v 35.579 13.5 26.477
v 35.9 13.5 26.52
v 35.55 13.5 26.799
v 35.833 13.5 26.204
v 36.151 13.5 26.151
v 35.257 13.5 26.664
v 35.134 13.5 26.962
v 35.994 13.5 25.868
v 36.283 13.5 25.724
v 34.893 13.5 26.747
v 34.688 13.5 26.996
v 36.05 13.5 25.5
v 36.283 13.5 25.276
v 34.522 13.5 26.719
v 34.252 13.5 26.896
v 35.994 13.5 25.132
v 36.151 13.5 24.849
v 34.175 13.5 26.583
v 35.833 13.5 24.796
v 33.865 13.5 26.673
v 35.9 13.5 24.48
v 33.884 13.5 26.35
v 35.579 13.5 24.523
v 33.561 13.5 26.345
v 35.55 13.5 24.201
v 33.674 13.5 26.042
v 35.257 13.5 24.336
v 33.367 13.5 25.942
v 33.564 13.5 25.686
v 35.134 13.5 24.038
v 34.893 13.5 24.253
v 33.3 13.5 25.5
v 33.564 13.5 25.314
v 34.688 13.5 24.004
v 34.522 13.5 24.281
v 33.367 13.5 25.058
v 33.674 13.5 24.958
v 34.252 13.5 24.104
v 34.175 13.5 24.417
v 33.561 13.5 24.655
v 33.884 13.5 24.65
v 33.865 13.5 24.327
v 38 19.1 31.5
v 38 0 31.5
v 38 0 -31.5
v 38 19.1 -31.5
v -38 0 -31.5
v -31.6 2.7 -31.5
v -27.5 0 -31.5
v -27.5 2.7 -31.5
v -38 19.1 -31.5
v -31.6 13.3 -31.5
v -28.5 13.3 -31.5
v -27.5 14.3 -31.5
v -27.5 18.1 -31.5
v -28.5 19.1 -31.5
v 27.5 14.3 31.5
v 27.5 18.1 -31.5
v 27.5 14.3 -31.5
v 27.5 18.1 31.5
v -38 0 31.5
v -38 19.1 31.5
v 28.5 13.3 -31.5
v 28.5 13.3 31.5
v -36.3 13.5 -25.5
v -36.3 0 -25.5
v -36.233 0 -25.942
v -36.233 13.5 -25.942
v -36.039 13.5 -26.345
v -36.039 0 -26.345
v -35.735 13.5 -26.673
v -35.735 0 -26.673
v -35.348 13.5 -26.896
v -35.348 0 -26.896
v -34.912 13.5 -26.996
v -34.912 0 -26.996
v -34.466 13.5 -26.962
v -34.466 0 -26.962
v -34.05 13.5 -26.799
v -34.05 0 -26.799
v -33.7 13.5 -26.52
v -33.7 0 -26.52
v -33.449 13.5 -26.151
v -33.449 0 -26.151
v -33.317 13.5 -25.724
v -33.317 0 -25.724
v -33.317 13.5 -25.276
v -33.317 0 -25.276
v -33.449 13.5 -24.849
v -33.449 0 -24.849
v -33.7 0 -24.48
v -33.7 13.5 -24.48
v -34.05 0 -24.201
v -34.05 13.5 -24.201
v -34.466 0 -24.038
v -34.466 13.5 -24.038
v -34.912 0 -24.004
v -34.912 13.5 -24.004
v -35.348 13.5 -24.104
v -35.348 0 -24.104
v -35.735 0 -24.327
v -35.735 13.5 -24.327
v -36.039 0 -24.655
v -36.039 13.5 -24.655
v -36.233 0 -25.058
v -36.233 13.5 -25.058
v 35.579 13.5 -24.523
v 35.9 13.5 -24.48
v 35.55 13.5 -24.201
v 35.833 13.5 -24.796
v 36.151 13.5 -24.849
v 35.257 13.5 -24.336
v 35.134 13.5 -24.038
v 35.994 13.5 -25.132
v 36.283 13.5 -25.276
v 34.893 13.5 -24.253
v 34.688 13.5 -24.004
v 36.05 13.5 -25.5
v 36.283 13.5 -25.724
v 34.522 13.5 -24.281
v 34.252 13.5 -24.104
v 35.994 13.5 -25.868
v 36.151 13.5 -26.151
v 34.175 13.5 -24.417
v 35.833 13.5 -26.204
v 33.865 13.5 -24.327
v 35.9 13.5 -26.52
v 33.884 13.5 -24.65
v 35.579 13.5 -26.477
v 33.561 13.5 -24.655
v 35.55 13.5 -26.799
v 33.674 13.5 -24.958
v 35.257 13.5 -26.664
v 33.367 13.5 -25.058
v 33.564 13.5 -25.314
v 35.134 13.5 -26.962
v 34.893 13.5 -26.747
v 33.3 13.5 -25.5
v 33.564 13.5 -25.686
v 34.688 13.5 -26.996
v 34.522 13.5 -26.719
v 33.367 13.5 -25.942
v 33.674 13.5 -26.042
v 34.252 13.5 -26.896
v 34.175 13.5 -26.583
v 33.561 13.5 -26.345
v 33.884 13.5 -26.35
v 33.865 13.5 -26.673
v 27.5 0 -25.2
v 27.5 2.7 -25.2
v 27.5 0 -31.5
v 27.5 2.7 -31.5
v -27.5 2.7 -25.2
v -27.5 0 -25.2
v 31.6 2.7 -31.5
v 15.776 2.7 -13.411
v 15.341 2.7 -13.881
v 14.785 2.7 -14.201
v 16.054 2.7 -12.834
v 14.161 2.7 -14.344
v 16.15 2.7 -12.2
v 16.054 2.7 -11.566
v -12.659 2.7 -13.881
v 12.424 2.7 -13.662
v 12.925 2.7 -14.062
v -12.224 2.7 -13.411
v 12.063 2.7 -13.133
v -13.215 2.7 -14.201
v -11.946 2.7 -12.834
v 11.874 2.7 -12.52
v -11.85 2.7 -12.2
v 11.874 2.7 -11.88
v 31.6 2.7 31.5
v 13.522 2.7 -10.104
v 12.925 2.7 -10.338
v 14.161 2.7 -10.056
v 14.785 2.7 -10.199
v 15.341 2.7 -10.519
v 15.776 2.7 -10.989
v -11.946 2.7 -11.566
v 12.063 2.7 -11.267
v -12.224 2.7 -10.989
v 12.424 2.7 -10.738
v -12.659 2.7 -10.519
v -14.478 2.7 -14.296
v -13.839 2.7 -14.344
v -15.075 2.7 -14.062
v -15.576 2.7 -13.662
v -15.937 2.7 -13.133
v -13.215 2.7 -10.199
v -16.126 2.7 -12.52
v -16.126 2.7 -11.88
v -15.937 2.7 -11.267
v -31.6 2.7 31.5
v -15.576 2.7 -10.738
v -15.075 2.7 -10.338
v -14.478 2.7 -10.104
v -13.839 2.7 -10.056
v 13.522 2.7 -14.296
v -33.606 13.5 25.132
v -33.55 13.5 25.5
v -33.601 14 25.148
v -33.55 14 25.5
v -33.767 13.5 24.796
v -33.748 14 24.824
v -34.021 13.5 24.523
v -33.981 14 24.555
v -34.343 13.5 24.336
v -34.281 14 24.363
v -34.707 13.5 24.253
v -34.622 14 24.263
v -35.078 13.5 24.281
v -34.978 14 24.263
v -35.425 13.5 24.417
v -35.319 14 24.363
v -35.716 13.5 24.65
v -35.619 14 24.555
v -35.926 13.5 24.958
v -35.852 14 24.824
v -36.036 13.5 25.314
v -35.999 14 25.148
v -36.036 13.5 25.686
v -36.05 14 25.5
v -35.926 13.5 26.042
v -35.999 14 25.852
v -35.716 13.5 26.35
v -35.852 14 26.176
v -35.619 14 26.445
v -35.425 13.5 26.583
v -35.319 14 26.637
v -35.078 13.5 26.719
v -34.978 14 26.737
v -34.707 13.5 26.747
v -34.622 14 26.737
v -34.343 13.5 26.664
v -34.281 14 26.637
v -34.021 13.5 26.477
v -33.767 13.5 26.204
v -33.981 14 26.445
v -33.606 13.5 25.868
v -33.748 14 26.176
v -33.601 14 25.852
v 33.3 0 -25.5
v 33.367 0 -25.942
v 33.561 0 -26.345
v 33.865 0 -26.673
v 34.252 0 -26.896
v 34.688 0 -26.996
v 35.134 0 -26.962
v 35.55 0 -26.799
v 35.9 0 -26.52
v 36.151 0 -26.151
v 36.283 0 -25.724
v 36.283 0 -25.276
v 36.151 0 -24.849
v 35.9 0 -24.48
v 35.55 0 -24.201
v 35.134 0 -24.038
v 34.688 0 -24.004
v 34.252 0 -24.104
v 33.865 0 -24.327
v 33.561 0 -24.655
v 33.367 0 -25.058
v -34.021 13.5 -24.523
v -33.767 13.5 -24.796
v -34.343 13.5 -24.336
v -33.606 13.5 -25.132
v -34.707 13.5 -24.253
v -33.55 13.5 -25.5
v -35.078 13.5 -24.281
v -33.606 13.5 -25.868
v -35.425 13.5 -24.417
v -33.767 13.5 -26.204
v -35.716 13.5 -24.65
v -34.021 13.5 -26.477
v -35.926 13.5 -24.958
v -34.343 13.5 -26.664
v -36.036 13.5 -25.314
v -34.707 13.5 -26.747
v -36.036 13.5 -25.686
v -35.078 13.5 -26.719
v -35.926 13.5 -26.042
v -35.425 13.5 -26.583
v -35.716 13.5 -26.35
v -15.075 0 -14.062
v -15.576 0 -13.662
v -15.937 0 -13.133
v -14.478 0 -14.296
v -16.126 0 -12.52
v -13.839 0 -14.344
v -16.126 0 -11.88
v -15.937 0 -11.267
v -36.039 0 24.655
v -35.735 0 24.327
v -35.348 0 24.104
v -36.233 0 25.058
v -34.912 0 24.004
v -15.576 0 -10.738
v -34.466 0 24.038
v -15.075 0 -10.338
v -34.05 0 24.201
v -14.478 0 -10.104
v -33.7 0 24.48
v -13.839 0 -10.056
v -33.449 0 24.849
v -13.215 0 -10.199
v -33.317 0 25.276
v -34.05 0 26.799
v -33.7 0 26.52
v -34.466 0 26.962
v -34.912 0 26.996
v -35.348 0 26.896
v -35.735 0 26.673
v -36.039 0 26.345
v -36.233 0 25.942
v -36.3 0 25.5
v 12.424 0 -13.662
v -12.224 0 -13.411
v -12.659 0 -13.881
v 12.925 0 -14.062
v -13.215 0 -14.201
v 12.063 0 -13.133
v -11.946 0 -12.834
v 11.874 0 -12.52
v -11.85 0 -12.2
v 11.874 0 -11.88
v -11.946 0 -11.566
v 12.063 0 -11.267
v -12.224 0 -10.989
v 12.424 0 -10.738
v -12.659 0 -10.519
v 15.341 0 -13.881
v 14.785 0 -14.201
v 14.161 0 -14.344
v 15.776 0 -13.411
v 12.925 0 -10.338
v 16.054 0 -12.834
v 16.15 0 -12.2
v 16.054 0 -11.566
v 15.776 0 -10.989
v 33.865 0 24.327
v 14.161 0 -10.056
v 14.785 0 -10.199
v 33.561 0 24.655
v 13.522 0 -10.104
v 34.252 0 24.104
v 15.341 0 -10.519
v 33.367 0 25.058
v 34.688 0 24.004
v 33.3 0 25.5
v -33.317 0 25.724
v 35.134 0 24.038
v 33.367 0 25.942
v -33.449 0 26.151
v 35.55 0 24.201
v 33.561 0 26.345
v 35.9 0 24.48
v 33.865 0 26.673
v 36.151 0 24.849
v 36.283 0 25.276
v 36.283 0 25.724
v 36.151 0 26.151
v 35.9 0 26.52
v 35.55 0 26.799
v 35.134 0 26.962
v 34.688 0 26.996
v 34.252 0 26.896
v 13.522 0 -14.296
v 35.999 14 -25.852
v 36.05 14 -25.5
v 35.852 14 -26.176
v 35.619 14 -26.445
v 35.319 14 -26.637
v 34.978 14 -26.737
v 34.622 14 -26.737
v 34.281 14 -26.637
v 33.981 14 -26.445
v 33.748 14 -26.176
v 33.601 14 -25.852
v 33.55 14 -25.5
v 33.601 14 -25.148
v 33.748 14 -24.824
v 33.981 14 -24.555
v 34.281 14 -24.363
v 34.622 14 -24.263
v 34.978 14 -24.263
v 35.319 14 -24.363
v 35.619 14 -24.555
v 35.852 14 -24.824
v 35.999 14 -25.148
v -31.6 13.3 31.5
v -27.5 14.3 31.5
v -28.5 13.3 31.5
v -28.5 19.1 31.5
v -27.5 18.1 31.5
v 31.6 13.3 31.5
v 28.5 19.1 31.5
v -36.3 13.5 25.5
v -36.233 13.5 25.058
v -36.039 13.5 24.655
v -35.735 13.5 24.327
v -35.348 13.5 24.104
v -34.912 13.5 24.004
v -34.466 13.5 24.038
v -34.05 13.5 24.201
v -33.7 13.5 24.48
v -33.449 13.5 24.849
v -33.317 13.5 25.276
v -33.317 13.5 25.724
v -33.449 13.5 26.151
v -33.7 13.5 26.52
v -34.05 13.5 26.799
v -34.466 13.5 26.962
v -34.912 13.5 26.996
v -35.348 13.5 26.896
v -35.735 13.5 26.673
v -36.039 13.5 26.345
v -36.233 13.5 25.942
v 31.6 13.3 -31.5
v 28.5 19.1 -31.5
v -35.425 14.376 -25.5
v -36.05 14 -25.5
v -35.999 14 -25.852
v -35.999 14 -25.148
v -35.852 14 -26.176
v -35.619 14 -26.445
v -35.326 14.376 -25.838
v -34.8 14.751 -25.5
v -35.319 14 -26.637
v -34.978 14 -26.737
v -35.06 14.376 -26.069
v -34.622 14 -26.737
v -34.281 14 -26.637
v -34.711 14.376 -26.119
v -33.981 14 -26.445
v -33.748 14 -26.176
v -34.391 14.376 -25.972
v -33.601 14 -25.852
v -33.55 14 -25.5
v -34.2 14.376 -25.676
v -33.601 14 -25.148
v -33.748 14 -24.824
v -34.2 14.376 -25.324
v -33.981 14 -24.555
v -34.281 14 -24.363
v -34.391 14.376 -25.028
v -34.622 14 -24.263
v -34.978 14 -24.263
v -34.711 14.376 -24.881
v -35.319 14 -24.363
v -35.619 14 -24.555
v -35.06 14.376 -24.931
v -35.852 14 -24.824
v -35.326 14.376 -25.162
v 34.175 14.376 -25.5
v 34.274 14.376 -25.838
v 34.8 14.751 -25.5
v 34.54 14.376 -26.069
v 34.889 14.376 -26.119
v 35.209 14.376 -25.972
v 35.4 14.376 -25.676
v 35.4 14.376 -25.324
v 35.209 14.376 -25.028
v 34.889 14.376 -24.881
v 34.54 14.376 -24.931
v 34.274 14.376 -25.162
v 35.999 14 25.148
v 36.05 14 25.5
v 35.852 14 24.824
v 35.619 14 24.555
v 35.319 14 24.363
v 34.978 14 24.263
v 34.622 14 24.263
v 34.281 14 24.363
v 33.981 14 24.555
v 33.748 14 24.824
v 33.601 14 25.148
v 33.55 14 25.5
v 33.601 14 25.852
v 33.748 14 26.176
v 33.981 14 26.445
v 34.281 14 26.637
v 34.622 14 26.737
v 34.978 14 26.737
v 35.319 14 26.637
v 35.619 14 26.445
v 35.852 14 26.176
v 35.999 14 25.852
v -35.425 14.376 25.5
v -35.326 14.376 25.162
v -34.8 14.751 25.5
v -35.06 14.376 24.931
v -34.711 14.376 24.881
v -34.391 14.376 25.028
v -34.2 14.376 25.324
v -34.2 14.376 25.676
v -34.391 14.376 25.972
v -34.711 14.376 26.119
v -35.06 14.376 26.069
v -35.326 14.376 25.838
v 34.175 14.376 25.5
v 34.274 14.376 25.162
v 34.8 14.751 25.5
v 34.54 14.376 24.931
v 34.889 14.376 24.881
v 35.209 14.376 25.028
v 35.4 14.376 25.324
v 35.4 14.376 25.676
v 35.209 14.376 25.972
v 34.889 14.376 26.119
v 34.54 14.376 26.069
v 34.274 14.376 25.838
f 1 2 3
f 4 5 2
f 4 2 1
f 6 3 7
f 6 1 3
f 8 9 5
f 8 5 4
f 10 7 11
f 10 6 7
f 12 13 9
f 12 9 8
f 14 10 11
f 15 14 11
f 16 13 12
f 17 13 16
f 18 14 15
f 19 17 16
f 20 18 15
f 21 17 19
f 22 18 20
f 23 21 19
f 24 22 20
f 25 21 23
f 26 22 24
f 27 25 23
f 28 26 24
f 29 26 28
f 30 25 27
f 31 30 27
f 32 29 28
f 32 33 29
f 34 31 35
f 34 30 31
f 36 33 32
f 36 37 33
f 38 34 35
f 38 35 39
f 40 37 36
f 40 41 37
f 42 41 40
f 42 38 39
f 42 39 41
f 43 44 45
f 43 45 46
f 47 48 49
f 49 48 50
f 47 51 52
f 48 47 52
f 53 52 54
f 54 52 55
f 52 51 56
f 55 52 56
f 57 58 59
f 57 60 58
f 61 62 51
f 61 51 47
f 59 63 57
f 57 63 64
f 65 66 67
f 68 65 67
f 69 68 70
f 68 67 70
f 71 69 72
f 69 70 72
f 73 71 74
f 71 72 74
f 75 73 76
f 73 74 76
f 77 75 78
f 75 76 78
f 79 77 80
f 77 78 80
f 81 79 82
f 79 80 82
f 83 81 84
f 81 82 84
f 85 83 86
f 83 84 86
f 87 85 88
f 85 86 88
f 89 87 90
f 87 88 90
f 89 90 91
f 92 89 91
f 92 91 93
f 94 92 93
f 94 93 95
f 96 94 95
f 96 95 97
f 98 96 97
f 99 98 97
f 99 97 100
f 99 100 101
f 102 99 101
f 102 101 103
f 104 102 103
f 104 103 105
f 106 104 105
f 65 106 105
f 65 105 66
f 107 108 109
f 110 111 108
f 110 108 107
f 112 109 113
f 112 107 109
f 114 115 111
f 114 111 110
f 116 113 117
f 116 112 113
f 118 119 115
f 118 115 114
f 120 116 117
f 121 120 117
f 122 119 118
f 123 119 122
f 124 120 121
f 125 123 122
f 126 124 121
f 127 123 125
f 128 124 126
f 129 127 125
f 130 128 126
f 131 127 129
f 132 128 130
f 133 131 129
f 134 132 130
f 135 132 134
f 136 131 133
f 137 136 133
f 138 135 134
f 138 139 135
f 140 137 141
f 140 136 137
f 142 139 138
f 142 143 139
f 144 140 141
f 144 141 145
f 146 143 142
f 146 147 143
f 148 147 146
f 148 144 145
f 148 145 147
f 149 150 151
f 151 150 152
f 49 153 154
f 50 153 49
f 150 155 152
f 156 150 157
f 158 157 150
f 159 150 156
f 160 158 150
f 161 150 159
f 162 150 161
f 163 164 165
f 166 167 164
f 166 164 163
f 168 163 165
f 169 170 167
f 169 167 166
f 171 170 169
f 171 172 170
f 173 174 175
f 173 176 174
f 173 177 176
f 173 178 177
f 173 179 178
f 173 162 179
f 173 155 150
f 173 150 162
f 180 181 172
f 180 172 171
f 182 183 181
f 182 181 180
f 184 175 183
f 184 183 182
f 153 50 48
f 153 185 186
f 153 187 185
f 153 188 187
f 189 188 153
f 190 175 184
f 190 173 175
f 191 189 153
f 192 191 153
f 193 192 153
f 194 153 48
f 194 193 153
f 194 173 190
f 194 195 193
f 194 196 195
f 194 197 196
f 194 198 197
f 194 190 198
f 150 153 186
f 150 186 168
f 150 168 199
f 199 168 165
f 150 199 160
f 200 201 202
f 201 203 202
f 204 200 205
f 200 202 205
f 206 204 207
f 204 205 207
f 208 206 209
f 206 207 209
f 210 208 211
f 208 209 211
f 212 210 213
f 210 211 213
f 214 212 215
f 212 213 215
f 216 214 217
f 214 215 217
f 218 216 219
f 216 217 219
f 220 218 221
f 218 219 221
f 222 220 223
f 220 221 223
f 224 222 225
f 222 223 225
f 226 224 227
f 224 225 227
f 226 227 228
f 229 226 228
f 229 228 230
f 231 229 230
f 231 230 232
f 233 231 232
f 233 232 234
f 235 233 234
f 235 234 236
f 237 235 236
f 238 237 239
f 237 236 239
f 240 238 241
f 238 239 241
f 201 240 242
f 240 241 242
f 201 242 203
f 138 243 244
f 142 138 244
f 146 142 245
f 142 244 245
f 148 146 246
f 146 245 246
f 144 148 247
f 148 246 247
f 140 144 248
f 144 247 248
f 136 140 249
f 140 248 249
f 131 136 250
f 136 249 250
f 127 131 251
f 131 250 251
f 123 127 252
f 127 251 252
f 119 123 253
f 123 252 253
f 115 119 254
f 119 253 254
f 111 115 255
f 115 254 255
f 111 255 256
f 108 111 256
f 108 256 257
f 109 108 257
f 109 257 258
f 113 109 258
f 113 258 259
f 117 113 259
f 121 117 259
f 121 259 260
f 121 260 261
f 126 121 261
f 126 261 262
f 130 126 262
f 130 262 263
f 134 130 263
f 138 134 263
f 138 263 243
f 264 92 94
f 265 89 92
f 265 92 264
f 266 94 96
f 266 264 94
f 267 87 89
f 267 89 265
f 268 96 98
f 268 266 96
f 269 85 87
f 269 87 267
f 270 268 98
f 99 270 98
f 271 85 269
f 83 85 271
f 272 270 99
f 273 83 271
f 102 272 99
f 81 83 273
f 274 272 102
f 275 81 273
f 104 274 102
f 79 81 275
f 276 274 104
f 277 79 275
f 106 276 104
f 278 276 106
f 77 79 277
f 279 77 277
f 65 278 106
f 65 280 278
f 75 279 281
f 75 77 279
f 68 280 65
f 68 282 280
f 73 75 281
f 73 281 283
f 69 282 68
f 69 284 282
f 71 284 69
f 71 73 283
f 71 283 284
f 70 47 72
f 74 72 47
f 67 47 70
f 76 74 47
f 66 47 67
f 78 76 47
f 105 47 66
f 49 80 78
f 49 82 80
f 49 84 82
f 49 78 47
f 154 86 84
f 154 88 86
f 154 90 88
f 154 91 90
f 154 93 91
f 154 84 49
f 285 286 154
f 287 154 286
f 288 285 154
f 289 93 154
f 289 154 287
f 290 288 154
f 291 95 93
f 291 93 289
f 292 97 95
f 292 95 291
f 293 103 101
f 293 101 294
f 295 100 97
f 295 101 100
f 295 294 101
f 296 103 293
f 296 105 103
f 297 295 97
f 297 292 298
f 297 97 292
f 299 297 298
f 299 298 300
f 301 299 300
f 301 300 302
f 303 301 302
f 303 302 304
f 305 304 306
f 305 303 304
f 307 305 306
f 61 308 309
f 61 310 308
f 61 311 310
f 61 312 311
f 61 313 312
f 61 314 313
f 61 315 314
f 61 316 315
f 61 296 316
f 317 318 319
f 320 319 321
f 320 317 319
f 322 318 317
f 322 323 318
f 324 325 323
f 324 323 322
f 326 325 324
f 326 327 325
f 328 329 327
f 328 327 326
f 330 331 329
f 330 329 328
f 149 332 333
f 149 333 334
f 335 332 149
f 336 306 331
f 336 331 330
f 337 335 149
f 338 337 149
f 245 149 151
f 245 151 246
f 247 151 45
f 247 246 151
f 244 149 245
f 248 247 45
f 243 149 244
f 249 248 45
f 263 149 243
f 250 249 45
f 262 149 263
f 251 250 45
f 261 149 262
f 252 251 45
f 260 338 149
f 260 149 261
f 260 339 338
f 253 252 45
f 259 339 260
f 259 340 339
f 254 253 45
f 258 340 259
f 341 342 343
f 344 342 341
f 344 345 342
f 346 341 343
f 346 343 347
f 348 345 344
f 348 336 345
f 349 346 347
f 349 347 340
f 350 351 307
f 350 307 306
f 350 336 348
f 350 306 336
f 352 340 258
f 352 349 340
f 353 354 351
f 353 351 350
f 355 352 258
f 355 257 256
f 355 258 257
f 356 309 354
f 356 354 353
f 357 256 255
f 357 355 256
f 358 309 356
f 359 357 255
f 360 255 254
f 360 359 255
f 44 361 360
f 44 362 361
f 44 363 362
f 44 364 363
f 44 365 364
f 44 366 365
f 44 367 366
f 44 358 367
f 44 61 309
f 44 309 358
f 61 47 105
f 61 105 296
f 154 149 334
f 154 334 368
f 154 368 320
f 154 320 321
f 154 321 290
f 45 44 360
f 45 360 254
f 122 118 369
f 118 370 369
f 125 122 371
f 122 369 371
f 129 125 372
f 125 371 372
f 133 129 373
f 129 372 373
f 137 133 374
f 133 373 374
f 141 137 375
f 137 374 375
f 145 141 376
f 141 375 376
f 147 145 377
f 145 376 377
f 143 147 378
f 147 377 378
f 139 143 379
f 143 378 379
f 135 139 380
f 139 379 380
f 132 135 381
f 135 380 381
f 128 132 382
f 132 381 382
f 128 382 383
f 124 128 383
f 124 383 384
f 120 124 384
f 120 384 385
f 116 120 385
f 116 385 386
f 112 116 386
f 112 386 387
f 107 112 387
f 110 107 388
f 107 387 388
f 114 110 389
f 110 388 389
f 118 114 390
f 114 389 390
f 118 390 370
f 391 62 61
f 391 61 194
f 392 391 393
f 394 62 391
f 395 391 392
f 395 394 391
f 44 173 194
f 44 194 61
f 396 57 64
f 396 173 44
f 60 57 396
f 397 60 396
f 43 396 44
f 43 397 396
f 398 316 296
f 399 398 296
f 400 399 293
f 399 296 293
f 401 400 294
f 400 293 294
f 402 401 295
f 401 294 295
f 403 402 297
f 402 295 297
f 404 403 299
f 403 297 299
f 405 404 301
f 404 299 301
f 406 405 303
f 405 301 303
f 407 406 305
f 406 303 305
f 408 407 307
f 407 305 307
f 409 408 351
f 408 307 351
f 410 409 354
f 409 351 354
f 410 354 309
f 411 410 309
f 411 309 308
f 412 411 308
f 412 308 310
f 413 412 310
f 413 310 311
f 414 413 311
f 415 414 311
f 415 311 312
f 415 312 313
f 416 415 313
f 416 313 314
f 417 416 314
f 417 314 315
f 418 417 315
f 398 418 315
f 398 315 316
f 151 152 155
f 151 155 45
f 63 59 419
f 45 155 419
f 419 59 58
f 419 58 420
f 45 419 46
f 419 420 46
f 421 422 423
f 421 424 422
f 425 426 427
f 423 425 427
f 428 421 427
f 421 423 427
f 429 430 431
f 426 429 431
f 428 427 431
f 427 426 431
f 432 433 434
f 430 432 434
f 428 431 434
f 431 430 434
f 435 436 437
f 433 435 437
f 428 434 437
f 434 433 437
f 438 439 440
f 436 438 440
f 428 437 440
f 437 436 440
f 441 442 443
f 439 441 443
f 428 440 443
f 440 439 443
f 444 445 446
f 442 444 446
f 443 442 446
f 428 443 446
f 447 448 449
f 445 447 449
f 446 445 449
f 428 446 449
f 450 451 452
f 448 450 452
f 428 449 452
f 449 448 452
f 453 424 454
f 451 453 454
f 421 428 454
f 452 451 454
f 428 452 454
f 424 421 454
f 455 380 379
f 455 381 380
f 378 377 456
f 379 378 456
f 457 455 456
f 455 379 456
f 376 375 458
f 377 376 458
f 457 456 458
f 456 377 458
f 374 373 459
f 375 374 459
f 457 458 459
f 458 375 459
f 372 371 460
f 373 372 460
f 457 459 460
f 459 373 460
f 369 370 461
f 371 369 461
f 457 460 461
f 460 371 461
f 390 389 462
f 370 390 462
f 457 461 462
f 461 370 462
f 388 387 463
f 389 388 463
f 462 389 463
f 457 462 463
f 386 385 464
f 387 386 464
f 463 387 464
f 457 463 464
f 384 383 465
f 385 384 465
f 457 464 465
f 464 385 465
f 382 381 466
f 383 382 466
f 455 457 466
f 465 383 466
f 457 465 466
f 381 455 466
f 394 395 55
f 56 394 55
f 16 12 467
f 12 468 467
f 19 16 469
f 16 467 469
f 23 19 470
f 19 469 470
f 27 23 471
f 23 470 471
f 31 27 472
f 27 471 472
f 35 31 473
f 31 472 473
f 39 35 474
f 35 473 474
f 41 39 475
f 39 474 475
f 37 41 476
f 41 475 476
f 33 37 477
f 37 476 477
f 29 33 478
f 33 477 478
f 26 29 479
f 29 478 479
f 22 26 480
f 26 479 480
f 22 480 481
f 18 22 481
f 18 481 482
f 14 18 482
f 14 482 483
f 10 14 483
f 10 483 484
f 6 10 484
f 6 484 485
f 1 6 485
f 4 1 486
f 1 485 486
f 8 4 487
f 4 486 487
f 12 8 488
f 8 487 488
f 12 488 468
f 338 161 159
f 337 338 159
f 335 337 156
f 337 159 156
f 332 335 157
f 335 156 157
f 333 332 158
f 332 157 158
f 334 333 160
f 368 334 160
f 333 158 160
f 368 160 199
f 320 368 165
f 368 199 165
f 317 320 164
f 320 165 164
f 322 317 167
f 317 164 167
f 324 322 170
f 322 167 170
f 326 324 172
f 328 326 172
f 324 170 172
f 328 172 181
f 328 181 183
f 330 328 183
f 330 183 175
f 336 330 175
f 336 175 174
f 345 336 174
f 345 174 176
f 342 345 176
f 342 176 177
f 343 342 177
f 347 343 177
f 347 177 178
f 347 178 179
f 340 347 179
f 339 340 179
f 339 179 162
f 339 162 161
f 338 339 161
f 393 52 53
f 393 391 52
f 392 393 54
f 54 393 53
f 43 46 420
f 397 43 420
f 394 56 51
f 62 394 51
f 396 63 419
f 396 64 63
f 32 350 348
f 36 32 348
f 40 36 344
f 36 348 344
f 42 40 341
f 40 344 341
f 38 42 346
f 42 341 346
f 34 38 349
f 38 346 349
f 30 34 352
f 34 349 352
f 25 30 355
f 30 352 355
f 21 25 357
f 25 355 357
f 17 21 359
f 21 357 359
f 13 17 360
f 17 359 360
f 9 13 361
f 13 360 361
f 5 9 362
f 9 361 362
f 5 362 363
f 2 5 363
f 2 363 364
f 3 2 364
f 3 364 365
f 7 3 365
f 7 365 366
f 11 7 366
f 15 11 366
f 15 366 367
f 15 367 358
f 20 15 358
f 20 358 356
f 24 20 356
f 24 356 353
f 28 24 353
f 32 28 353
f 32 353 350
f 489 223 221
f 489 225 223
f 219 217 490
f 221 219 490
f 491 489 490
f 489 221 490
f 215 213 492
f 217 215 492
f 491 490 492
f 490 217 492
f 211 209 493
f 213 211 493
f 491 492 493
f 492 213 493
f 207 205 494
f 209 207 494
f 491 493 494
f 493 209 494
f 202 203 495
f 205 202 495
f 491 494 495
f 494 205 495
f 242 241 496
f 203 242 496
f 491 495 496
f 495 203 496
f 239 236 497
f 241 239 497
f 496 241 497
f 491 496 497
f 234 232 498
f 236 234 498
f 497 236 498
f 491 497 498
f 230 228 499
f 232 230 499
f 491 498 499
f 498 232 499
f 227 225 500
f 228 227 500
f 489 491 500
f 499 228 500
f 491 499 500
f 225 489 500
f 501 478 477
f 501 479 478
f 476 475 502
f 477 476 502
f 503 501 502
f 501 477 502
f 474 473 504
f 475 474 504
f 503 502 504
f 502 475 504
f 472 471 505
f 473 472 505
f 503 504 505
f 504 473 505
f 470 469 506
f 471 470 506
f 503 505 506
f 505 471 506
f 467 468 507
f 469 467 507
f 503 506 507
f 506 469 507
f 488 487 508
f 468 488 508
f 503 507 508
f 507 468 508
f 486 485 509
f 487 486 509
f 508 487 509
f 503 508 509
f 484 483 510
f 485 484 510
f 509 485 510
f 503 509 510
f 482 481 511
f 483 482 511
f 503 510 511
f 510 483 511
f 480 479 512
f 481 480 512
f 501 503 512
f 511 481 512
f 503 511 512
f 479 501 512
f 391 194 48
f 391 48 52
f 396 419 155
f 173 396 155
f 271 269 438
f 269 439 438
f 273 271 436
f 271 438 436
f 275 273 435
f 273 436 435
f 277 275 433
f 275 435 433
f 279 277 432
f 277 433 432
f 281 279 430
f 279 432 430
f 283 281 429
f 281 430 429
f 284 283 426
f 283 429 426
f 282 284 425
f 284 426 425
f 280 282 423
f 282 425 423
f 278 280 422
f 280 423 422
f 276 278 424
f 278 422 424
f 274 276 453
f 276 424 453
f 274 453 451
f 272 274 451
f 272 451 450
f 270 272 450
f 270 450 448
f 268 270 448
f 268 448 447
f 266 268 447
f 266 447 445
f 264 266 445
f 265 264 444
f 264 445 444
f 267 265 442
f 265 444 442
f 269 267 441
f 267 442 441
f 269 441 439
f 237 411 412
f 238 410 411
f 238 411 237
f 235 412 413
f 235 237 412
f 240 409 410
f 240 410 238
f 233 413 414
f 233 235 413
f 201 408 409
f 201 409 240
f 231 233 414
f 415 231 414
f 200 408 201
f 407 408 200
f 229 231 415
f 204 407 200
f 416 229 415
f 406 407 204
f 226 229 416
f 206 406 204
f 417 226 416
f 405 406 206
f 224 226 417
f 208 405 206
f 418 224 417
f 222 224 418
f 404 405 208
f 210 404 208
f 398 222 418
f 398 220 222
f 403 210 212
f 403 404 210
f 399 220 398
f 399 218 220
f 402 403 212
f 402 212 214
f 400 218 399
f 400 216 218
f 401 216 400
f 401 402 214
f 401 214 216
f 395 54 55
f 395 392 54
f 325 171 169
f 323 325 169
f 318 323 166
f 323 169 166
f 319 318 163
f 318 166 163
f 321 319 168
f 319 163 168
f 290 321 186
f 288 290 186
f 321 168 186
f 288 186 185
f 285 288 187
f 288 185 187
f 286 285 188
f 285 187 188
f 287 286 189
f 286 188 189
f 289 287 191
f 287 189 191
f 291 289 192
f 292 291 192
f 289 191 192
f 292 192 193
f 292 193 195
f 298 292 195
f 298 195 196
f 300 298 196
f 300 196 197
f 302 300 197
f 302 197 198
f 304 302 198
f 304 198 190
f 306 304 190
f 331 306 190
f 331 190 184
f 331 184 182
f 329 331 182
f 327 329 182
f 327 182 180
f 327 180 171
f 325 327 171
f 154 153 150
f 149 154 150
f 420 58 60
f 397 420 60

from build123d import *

# Parameters (mm, degrees)
EXTRUDE_1_DEPTH              = 31.5
HOLE_WIZARD_M3_1_D           = 2.5
HOLE_WIZARD_M3_1_DEPTH       = 14
HOLE_WIZARD_M3_1_CBORE_D     = 3
HOLE_WIZARD_M3_1_CBORE_DEPTH = 13.5
HOLE_WIZARD_M3_1_TIP         = 0.751075774
HOLE_WIZARD_M4_1_D           = 4.3
CUT_EXTRUDE_1_REACH          = 54.012
SKETCH_6_W                   = 55
SKETCH_6_H                   = 6.3
CHAMFER_1_SIZE               = 1


with BuildPart() as part:
    # 草图1 → 凸台-拉伸1 (new, symmetric)
    with BuildSketch(Plane.XY):
        Polygon((-27.5, 19.1), (-38, 19.1), (-38, 0), (38, 0), (38, 19.1), (27.5, 19.1), (27.5, 13.3), (31.6, 13.3), (31.6, 2.7), (-31.6, 2.7), (-31.6, 13.3), (-27.5, 13.3), align=None)
    extrude(amount=EXTRUDE_1_DEPTH, both=True)

    # M3 螺纹孔1
    with Locations(Plane(origin=(0, 0, 0), x_dir=(-1, 0, 0), z_dir=(0, -1, 0))):
        with Locations((34.8, 25.5), (34.8, -25.5), (-34.8, -25.5), (-34.8, 25.5)):
            CounterBoreHole(HOLE_WIZARD_M3_1_D / 2, HOLE_WIZARD_M3_1_CBORE_D / 2, HOLE_WIZARD_M3_1_CBORE_DEPTH, depth=HOLE_WIZARD_M3_1_DEPTH)
            with Locations((0, 0, -(HOLE_WIZARD_M3_1_DEPTH + HOLE_WIZARD_M3_1_TIP / 2))):  # 118° drill point
                Cone(0, HOLE_WIZARD_M3_1_D / 2, HOLE_WIZARD_M3_1_TIP, mode=Mode.SUBTRACT)

    # M4 间隙孔1 (through all)
    with Locations(Plane(origin=(0, 0, 0), x_dir=(-1, 0, 0), z_dir=(0, -1, 0))):
        with Locations((-14, 12.2), (14, 12.2)):
            Hole(HOLE_WIZARD_M4_1_D / 2)

    # 草图6 → 切除-拉伸1 (cut, up to next)
    with BuildSketch(Plane(origin=(0, 2.7, 0), x_dir=(1, 0, 0), z_dir=(0, 1, 0)), mode=Mode.PRIVATE) as cut_extrude_1_sk1:
        with Locations((0, 28.35)):
            Rectangle(SKETCH_6_W, SKETCH_6_H)
    cut_extrude_1_tool1 = extrude(cut_extrude_1_sk1.sketch, amount=-CUT_EXTRUDE_1_REACH, mode=Mode.PRIVATE) & part.part
    add(cut_extrude_1_tool1.solids().sort_by_distance((0, 2.7, -28.35))[0], mode=Mode.SUBTRACT)

    # 倒角1
    chamfer_1_edges = [part.edges().sort_by_distance(p)[0] for p in [
        (-27.5, 13.3, 0),
        (27.5, 13.3, 0),
        (27.5, 19.1, 0),
        (-27.5, 19.1, 0),
    ]]
    chamfer(chamfer_1_edges, length=CHAMFER_1_SIZE)


solid = part.part
